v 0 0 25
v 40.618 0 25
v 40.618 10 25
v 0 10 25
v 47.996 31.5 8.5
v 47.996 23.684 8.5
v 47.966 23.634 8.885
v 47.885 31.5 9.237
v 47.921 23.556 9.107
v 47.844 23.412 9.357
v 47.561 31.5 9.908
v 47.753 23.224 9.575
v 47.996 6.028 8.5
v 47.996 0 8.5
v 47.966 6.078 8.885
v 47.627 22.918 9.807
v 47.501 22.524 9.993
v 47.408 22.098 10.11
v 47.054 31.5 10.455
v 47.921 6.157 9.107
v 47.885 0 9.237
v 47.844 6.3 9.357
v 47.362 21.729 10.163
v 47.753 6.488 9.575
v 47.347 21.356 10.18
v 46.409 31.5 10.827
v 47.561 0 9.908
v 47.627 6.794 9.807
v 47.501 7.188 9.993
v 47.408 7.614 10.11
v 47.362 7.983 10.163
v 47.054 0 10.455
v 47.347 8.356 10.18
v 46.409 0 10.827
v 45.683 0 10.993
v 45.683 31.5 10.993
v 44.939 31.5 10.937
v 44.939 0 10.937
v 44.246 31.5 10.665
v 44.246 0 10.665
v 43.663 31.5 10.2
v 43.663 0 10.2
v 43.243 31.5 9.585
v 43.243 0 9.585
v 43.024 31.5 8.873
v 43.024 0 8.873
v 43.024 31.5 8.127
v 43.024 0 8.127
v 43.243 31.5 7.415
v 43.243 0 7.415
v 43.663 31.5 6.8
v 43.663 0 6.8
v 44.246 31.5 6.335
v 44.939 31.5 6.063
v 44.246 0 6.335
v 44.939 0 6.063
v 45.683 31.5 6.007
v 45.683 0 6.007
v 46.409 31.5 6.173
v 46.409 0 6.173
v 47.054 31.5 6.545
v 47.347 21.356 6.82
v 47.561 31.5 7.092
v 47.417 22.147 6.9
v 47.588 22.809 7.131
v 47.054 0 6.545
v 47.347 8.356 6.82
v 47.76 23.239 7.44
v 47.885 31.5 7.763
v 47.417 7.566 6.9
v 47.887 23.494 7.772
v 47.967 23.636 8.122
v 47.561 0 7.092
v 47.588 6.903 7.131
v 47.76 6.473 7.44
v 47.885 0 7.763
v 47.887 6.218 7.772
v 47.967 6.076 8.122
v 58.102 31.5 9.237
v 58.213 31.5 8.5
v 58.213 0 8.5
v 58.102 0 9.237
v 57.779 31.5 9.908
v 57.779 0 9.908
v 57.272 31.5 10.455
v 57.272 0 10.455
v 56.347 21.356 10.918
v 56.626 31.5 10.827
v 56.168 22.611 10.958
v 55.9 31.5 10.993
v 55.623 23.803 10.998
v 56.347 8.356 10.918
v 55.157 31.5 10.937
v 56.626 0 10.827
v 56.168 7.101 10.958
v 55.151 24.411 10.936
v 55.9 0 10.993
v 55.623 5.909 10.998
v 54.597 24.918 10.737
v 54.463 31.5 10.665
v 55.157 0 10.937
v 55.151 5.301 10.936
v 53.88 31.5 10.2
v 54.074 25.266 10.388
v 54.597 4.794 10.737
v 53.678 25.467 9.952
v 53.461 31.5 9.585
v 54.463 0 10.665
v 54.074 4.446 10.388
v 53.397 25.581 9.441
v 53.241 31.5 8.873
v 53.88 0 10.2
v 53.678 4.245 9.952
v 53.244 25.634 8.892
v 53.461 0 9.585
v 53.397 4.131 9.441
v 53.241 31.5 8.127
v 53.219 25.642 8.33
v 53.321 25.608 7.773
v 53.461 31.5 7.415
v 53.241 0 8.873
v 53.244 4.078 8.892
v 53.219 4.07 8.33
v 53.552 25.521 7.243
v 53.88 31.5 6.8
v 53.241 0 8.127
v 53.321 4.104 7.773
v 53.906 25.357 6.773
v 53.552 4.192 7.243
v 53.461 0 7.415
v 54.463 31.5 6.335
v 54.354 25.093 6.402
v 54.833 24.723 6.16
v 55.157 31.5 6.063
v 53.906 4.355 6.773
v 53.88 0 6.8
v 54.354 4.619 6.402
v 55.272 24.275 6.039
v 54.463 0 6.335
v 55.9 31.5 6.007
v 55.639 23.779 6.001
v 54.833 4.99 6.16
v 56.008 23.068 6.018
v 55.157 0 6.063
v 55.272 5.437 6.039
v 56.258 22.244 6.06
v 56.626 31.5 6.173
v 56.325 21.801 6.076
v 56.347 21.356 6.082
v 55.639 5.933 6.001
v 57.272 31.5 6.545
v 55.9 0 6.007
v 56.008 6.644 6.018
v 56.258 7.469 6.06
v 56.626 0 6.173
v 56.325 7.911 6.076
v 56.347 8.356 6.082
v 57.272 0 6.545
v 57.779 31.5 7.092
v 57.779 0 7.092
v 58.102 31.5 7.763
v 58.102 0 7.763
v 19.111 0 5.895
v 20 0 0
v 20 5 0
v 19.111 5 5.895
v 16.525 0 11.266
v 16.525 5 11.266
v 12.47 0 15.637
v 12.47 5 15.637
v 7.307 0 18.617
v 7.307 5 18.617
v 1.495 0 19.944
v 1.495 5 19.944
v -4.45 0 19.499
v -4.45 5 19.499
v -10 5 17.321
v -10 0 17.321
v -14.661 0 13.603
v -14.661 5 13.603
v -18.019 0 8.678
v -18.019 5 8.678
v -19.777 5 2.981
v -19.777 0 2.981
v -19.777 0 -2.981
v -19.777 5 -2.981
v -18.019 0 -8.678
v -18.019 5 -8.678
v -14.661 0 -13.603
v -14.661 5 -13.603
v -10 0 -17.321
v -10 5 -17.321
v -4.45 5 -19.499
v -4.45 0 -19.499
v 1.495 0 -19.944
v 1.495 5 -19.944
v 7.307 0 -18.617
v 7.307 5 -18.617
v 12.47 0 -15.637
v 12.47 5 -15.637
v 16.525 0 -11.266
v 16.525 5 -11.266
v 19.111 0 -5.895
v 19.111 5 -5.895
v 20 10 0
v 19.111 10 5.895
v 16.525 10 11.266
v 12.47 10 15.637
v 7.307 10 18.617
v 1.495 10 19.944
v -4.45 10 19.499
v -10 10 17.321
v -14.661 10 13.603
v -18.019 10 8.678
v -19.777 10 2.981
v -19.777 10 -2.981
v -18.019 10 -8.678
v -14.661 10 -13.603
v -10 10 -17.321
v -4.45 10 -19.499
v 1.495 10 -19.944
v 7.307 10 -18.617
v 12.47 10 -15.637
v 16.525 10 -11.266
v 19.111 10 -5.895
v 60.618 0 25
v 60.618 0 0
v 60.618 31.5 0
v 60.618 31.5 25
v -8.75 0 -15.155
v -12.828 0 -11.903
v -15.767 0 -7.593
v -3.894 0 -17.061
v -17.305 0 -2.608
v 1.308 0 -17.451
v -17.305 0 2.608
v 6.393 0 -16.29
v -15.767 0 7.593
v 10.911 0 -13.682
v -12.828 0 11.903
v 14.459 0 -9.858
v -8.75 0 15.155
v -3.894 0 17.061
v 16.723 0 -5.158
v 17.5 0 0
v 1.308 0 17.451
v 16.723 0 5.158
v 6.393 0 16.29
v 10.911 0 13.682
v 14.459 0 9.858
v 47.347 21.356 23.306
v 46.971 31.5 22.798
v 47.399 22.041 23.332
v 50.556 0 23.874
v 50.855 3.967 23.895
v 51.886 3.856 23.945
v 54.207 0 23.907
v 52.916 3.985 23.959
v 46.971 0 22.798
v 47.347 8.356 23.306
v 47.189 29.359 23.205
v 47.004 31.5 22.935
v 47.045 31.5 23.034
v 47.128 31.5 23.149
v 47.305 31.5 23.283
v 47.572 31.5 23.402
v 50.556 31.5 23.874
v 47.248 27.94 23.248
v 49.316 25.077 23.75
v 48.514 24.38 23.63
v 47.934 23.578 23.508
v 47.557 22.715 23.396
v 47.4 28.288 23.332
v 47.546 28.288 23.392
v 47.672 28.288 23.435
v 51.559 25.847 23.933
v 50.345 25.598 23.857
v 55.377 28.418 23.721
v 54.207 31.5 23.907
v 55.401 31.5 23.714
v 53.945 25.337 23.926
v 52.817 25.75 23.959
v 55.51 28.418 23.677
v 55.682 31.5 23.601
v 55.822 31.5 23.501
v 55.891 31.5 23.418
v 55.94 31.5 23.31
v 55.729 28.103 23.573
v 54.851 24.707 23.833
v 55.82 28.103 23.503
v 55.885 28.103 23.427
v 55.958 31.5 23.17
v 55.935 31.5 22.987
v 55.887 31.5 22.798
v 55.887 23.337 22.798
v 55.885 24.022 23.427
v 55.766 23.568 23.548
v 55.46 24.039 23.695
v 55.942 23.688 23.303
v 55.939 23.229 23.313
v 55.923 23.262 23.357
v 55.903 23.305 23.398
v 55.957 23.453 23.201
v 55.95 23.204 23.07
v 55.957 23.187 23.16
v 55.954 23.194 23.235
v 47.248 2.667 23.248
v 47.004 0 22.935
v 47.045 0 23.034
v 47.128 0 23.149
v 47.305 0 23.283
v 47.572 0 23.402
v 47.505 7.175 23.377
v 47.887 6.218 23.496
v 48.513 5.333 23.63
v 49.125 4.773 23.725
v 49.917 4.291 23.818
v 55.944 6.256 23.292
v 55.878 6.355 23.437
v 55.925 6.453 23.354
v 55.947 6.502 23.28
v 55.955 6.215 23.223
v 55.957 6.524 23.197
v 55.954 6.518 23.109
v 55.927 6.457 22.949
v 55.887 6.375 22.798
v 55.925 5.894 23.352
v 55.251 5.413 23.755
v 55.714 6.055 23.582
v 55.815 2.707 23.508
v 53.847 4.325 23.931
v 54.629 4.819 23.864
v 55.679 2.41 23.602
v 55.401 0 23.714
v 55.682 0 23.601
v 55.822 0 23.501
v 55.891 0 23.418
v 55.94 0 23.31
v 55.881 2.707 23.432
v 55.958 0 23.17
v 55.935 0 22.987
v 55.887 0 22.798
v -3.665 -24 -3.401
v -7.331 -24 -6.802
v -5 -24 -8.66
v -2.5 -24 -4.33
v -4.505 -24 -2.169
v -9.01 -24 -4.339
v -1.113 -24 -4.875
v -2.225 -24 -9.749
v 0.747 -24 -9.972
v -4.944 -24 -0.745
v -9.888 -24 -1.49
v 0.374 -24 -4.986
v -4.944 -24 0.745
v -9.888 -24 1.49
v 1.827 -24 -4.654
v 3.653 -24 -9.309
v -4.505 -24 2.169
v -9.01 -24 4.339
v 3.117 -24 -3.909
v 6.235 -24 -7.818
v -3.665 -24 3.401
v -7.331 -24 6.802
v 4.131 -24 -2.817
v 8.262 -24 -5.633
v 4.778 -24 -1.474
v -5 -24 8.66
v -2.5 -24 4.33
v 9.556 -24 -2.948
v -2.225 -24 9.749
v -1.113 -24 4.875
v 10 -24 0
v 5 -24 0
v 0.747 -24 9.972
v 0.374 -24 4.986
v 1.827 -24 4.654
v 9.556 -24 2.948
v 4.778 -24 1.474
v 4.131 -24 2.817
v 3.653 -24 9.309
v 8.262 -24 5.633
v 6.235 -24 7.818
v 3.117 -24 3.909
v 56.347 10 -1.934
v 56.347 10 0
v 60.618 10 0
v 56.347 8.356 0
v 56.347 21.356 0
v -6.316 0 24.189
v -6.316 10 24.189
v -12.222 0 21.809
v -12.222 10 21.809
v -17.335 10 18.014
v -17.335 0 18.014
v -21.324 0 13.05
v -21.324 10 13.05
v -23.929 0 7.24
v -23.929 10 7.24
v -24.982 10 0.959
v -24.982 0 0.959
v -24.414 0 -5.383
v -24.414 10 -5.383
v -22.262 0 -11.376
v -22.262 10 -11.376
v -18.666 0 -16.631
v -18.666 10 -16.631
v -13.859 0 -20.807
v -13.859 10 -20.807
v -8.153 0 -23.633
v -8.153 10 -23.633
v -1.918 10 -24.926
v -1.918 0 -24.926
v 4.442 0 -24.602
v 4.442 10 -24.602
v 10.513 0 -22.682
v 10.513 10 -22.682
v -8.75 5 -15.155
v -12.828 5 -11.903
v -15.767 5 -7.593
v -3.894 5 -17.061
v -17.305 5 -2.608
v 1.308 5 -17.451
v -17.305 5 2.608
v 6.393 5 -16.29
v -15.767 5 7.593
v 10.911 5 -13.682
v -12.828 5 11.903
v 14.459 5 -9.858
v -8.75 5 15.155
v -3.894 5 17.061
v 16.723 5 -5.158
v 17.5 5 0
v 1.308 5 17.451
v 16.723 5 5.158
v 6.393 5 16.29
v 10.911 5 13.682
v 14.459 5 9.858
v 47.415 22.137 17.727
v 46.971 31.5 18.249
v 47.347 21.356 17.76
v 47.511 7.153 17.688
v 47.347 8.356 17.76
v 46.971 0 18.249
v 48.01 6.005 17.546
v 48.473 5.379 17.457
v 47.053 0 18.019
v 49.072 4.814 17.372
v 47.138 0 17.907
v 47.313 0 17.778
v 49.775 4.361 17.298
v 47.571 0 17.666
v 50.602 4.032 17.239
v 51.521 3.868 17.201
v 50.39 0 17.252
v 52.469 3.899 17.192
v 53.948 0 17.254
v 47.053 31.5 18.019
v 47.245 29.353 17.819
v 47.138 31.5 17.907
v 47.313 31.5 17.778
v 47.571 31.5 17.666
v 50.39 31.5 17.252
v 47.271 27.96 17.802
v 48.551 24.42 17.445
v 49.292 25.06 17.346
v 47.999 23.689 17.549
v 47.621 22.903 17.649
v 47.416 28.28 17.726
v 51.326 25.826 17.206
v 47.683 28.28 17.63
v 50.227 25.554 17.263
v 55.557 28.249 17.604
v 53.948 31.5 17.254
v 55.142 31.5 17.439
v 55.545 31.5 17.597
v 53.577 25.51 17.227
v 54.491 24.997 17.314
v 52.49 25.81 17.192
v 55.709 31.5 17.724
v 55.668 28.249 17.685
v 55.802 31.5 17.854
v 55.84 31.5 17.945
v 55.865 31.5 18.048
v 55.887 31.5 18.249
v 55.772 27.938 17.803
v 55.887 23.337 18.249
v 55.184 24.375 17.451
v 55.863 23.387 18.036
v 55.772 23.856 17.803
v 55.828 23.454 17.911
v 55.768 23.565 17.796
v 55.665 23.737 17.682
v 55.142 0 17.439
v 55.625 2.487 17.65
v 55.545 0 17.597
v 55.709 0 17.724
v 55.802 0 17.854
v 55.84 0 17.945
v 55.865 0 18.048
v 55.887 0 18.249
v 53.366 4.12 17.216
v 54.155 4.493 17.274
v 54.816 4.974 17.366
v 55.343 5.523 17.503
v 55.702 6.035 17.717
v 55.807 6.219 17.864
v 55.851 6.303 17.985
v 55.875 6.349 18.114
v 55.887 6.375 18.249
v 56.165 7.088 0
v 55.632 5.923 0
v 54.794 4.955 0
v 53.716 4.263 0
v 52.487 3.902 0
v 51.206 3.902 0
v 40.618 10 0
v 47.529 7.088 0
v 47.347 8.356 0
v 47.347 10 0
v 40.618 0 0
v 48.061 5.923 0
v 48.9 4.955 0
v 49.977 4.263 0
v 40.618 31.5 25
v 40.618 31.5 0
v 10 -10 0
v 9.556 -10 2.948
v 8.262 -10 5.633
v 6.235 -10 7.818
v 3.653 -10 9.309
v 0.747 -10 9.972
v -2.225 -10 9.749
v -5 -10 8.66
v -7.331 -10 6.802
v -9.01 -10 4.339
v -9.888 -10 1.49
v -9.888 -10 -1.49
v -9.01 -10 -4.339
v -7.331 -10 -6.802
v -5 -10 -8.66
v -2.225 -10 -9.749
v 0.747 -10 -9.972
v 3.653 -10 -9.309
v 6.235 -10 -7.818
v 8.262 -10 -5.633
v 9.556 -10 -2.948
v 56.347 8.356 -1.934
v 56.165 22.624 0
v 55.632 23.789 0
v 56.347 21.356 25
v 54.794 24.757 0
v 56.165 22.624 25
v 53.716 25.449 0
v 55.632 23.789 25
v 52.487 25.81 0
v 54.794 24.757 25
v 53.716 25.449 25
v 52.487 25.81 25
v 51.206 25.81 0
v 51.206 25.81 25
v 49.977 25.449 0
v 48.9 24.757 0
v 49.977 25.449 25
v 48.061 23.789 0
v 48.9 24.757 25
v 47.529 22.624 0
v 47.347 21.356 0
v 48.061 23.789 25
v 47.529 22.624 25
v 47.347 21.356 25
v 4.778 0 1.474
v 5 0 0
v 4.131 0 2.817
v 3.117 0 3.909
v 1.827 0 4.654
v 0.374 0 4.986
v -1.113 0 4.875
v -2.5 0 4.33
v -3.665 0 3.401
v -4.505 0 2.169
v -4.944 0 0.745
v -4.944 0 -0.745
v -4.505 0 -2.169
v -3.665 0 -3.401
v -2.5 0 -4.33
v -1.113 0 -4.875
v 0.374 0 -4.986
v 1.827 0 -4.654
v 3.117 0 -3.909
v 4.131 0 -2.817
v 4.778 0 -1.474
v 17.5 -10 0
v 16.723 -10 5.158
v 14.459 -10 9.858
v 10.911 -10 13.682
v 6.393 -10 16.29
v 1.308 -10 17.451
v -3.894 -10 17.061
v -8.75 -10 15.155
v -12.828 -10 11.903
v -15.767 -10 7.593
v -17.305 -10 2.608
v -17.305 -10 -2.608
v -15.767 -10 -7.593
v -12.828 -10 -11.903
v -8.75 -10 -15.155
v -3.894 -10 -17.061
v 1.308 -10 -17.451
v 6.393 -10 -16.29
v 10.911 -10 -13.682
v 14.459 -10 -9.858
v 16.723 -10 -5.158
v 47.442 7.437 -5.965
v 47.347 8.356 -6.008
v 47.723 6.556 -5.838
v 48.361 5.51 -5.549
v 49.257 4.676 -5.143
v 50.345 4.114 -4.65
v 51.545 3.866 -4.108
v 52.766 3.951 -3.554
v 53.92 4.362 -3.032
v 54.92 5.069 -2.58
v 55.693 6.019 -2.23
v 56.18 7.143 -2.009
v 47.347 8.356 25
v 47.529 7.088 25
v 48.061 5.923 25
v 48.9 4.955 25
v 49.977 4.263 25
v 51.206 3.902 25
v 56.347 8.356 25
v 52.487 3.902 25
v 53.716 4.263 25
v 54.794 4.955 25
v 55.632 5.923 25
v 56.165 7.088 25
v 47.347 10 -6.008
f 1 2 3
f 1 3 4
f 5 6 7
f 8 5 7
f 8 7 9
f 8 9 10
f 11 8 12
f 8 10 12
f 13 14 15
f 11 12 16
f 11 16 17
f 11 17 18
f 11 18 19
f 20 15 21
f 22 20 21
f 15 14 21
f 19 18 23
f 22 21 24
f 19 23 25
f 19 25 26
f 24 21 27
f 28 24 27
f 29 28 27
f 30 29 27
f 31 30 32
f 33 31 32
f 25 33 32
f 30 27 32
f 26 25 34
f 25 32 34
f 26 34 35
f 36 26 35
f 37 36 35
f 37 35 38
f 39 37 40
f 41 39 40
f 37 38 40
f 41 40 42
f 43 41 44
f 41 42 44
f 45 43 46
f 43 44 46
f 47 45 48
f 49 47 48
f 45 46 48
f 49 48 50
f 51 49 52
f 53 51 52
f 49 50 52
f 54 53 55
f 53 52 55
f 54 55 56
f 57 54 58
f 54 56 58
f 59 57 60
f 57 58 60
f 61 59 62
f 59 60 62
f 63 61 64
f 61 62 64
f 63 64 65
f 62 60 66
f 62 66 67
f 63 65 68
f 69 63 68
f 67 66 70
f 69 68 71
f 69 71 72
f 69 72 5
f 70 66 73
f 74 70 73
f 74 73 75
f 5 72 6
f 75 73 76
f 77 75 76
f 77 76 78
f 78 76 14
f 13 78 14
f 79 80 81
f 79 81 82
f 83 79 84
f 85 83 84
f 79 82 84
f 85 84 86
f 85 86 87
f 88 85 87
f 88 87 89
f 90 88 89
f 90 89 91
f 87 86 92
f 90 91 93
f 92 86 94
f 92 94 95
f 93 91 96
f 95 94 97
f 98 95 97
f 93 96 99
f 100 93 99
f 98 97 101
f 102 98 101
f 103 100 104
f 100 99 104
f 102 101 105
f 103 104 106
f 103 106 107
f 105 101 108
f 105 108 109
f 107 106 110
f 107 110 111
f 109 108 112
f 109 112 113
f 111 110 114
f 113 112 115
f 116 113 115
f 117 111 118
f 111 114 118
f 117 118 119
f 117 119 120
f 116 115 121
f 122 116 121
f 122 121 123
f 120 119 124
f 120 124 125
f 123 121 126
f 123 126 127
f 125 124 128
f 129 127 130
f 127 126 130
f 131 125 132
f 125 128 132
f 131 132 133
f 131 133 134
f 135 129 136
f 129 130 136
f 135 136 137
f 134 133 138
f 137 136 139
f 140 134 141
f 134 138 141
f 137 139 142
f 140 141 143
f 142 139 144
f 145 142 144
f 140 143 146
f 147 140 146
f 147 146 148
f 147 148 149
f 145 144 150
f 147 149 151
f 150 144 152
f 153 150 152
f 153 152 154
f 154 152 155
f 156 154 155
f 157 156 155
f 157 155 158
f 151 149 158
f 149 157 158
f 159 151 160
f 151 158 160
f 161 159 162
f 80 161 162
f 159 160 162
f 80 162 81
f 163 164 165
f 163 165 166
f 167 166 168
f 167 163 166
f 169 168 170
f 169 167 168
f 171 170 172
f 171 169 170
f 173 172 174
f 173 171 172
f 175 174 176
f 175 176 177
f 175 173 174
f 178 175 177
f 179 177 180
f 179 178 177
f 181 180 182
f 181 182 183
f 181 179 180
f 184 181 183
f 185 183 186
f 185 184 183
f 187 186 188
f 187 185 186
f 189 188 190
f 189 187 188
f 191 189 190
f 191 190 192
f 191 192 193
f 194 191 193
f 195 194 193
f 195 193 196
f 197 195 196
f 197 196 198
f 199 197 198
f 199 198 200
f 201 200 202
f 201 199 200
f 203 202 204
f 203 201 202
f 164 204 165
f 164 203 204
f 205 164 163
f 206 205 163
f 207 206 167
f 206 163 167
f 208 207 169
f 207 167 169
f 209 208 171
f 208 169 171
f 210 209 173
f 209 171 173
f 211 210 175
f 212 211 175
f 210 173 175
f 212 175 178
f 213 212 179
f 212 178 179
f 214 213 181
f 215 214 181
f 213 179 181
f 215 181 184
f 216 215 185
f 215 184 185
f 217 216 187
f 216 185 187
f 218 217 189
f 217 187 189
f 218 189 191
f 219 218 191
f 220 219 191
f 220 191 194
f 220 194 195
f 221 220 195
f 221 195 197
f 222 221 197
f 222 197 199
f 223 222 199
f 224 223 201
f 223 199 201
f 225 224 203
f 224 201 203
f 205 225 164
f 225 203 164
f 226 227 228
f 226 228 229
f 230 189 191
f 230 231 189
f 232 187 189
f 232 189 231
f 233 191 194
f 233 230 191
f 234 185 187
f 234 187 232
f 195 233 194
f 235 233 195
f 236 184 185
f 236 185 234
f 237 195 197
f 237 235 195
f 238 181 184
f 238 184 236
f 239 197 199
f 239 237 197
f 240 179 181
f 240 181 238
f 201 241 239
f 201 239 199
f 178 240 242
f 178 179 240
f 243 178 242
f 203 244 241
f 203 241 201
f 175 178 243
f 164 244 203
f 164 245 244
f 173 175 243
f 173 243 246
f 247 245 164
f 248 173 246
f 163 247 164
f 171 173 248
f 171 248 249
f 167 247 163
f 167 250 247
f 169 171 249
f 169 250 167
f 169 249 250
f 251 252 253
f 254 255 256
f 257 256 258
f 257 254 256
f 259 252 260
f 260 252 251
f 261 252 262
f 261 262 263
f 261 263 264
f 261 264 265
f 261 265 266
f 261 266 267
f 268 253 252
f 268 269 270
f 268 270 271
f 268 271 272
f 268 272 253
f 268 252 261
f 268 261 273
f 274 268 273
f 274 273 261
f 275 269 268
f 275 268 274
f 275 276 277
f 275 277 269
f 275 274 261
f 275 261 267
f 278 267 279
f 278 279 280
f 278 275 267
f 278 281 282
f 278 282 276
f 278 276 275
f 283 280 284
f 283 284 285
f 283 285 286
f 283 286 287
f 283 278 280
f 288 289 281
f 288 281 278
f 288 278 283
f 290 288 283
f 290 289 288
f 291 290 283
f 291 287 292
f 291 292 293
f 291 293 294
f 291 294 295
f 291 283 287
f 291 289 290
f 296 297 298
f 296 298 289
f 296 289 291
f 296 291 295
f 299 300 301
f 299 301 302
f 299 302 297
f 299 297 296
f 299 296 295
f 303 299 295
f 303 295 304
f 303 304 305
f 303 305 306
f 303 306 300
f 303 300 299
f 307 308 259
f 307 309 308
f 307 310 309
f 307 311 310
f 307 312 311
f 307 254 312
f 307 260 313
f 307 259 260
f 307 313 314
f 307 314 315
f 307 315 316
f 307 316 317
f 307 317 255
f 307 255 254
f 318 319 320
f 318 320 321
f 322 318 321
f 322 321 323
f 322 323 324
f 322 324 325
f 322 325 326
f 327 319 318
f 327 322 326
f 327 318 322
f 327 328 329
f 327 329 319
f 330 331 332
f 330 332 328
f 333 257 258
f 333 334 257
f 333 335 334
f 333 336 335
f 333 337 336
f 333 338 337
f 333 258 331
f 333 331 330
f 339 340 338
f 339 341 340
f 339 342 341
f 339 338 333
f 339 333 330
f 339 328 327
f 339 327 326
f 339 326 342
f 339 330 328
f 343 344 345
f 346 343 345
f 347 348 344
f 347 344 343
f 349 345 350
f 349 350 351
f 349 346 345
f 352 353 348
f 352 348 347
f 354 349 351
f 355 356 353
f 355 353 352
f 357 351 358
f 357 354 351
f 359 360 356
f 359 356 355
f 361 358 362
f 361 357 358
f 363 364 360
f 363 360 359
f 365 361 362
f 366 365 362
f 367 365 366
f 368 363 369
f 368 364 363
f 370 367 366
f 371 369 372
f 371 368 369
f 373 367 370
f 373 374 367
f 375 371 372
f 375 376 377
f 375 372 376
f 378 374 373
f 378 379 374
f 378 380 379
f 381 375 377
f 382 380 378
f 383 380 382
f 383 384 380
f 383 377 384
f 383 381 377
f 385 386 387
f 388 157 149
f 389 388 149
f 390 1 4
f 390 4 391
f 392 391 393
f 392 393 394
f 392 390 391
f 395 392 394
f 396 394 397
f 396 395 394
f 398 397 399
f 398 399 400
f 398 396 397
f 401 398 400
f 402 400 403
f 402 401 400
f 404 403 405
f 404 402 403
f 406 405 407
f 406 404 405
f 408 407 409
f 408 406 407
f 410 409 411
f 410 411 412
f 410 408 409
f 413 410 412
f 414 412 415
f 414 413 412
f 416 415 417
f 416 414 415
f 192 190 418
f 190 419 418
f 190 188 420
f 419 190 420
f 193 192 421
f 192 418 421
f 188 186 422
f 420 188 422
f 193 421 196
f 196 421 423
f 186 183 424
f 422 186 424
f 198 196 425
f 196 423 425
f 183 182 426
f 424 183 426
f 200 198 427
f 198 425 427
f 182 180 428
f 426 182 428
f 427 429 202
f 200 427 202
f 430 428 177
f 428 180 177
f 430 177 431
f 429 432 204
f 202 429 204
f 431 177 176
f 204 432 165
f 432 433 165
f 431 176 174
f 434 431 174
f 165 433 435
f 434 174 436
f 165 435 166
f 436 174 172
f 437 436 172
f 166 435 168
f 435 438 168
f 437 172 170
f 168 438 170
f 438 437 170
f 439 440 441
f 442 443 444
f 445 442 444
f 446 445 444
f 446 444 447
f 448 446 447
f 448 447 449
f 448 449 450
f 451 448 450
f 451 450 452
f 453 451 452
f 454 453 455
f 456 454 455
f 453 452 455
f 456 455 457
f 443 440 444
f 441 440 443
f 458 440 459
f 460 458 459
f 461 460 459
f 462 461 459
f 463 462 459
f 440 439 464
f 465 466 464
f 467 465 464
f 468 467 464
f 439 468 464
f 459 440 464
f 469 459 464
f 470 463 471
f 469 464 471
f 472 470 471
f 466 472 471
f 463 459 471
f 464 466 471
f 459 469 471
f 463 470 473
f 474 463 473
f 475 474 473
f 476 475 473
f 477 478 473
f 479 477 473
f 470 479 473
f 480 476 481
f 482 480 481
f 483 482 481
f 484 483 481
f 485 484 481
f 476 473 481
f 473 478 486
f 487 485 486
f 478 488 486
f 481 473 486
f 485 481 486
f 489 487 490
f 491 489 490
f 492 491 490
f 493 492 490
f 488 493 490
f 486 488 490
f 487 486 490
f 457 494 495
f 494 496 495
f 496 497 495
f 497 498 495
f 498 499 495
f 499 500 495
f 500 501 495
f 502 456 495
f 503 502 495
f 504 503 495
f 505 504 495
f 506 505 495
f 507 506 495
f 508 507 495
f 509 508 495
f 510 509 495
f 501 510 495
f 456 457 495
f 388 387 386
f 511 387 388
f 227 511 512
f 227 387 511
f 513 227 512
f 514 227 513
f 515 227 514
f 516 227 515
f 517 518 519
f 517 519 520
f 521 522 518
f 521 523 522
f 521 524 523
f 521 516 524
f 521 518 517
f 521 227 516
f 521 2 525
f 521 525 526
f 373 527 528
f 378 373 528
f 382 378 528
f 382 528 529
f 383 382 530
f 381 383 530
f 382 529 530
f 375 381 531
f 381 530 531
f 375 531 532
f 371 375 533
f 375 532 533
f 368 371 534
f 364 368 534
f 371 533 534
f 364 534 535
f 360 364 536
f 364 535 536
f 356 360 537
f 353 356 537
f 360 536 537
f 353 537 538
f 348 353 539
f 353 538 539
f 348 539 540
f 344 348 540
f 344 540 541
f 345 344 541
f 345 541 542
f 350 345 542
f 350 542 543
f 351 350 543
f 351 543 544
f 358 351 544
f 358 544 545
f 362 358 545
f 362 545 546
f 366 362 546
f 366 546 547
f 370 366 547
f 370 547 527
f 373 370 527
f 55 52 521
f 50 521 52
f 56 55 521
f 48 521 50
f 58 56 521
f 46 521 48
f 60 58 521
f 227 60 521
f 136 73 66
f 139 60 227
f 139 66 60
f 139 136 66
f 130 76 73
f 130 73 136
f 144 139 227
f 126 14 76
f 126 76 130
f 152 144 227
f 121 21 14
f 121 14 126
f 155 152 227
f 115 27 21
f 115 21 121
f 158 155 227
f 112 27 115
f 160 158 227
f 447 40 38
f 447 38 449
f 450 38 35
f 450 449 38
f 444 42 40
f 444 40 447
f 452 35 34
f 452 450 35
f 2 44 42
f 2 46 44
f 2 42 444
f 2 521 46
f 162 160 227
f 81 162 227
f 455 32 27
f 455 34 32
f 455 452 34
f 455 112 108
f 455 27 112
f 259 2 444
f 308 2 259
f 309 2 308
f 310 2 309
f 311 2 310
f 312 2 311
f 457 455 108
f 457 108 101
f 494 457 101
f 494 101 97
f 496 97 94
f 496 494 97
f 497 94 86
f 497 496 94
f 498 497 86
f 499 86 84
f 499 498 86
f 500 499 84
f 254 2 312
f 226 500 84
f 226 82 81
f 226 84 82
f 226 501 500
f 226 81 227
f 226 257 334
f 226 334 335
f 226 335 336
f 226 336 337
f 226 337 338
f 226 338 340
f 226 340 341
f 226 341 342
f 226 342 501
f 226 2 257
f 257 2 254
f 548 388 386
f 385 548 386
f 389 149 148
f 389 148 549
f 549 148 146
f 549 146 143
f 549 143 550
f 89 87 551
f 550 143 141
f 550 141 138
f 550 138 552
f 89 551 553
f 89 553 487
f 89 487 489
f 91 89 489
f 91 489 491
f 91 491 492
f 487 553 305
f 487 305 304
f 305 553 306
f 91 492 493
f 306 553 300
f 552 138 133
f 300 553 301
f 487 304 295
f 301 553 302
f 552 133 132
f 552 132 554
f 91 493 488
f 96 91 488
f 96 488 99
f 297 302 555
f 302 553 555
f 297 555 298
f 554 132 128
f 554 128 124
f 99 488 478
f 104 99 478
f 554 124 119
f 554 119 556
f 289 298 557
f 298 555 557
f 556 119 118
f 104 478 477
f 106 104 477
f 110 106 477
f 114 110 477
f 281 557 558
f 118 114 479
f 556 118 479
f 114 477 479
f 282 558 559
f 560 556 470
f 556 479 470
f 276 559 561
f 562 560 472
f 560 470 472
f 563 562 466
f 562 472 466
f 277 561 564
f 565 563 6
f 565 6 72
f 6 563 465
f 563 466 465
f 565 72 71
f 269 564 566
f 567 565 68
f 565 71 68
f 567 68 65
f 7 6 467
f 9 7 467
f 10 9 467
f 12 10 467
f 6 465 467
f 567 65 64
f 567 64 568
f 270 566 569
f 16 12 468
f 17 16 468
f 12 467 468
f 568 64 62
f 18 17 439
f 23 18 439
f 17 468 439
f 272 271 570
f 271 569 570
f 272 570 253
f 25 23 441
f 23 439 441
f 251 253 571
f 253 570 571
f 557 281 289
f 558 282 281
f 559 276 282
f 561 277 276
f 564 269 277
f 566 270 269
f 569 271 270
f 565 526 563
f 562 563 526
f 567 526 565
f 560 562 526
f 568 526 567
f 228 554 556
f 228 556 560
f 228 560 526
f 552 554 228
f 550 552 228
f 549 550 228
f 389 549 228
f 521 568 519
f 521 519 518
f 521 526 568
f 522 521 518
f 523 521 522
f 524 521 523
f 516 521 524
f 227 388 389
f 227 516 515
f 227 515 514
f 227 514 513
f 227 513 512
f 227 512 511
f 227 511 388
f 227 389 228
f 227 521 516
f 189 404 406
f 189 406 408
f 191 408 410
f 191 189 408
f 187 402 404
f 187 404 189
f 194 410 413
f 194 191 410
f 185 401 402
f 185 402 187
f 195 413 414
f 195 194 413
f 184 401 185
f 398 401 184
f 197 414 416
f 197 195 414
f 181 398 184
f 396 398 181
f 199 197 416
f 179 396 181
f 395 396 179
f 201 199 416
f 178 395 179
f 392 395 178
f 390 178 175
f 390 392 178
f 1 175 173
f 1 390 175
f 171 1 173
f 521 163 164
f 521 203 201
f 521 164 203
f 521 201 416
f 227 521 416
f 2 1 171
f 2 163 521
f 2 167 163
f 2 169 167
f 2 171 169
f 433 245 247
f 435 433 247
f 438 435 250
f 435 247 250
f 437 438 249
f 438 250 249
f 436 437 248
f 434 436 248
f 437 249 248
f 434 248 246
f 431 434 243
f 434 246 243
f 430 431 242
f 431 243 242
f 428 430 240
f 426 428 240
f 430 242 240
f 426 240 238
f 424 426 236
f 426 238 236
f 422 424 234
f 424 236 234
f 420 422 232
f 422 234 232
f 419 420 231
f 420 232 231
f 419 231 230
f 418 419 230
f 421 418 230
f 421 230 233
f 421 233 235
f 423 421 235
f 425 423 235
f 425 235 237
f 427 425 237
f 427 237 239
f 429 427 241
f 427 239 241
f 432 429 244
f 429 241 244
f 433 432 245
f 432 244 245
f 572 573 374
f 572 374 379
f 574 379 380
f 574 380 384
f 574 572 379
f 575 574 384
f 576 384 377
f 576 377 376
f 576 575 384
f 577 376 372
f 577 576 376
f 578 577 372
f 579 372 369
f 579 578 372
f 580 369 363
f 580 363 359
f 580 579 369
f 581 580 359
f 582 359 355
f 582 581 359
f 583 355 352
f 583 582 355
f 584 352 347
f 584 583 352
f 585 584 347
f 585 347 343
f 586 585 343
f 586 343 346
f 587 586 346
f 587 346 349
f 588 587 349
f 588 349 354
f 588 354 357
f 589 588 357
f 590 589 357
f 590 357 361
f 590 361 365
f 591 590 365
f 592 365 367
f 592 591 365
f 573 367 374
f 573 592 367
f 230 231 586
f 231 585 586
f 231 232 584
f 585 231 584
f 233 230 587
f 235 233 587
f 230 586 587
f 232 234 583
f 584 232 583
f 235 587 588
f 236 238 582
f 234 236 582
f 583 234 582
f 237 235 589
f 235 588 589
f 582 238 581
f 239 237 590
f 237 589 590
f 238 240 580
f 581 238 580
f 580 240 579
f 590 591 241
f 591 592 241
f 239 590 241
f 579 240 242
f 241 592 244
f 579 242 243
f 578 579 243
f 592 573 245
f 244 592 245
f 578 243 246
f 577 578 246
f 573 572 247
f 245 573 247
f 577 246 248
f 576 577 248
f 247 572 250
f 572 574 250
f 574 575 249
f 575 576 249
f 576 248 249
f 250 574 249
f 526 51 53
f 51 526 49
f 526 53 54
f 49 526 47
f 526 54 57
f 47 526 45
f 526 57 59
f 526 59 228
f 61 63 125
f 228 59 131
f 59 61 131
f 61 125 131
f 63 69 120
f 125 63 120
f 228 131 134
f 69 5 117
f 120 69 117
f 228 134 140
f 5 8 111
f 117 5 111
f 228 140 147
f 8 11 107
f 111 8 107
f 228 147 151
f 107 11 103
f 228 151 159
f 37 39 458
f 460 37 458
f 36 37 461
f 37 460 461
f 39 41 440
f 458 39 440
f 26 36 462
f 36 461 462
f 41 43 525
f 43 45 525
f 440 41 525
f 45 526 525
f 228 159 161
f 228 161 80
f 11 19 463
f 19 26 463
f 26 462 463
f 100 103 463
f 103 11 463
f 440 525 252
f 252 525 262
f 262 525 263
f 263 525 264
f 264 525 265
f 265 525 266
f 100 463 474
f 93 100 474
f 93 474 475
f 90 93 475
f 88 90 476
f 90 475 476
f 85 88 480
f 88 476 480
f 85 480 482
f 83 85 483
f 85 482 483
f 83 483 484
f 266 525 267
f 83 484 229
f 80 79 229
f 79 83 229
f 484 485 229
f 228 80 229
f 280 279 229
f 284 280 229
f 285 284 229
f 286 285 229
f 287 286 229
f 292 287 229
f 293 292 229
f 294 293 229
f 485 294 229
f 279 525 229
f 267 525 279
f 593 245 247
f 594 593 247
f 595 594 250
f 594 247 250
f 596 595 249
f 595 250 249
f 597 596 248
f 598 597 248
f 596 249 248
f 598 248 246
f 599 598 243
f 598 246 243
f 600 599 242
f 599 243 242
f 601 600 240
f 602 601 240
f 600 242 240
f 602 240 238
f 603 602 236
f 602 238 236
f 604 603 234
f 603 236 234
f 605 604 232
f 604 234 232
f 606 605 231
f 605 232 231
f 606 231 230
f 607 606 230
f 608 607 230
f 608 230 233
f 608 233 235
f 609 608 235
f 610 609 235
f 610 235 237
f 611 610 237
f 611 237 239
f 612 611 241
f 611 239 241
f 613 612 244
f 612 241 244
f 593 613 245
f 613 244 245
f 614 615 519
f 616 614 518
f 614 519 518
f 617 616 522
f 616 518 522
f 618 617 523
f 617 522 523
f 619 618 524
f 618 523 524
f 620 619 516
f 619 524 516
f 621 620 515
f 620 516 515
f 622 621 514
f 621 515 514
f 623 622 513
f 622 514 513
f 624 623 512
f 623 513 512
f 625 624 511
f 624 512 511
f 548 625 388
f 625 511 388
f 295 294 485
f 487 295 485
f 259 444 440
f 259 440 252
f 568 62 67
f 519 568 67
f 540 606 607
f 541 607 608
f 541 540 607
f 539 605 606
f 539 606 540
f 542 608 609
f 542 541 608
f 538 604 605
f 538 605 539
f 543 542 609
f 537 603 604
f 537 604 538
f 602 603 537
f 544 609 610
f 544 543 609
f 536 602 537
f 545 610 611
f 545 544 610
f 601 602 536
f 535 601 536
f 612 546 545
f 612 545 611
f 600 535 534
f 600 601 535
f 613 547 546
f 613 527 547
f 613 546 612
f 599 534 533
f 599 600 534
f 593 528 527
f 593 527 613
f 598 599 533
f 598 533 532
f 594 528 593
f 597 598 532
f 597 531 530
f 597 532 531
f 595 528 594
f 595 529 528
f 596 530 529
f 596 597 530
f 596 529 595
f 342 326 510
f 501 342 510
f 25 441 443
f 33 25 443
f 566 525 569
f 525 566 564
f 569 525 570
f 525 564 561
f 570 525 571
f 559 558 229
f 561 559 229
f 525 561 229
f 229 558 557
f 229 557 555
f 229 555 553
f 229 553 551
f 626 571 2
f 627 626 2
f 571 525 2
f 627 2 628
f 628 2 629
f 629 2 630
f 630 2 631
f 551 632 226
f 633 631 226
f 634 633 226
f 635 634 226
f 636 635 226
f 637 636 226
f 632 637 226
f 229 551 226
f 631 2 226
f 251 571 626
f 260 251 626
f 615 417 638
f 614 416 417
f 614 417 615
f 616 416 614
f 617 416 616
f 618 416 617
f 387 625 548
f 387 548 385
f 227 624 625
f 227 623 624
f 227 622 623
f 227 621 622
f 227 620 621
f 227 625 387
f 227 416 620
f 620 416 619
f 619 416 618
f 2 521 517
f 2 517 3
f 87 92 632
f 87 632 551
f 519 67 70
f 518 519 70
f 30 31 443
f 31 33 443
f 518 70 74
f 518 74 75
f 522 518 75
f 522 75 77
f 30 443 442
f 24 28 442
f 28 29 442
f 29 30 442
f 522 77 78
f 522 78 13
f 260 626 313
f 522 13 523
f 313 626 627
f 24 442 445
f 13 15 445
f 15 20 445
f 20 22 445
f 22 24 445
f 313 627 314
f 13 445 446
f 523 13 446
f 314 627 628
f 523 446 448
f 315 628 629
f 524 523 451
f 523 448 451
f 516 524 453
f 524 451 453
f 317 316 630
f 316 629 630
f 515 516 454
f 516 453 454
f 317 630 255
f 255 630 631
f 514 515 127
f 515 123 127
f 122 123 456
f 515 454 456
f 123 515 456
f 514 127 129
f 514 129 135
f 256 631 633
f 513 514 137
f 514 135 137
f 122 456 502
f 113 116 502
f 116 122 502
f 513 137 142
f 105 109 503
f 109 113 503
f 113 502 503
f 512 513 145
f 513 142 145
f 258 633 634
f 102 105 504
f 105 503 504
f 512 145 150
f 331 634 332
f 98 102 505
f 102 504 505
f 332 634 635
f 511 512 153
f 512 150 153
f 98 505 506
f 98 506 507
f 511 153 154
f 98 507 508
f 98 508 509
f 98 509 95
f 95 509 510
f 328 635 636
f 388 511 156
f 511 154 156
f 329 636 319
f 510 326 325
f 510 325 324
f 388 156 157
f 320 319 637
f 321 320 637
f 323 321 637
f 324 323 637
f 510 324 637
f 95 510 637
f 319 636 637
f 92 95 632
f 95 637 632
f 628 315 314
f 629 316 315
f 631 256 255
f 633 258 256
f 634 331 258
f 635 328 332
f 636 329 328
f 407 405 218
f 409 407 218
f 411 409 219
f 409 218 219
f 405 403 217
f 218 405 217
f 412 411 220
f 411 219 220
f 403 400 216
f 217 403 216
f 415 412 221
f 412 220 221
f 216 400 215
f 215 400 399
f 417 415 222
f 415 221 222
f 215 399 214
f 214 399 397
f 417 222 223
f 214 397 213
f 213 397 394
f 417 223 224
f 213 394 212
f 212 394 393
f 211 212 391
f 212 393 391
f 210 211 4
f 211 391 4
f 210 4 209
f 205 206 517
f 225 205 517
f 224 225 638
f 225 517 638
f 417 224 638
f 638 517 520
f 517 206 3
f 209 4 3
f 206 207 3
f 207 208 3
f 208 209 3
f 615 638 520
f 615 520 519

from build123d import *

# Parameters (mm, degrees)
F0_R          = 20
F1_DEPTH      = 10
F0_R_2        = 17.5
F2_DEPTH      = 5
F0_R_3        = 10
F3_DEPTH      = 10
F0_R_4        = 5
F4_DEPTH      = 24
F0_W          = 20
F0_H          = 17
F0_R_5        = 2.5
F0_H_2        = 8
F5_DEPTH      = 31.5
F7_DEPTH      = 25
F7_DEPTH_BACK = 25


with BuildPart() as f1:
    # F0 (on Front) → F1 (new body)
    with BuildSketch(Plane.XZ):
        with BuildLine():
            ThreePointArc((0, 25), (-24.4136250072, -5.3828351274), (10.513161462, -22.6820068793))
            Line((10.513161462, -22.6820068793), (60.6183165254, 0))
            Line((60.6183165254, 0), (40.6183165254, 0))
            Line((40.6183165254, 0), (40.6183165254, 17))
            Line((40.6183165254, 17), (40.6183165254, 25))
            Line((40.6183165254, 25), (0, 25))
        make_face()
        Circle(F0_R, mode=Mode.SUBTRACT)
    extrude(amount=-F1_DEPTH)


with BuildPart() as f2:
    # F0 (on Front) → F2 (new body)
    with BuildSketch(Plane.XZ):
        Circle(F0_R)
        Circle(F0_R_2, mode=Mode.SUBTRACT)
    extrude(amount=-F2_DEPTH)


with BuildPart() as f3:
    # F0 (on Front) → F3 (new body)
    with BuildSketch(Plane.XZ):
        Circle(F0_R_2)
        Circle(F0_R_3, mode=Mode.SUBTRACT)
    extrude(amount=F3_DEPTH)

    # F0 (on Front) → F4 (join)
    with BuildSketch(Plane.XZ):
        Circle(F0_R_3)
        Circle(F0_R_4, mode=Mode.SUBTRACT)
    extrude(amount=F4_DEPTH)


with BuildPart() as f5:
    # F0 (on Front) → F5 (new body)
    with BuildSketch(Plane.XZ):
        with Locations((50.6183165254, 8.5)):
            Rectangle(F0_W, F0_H)
        with Locations((45.4957149923, 8.5)):
            Circle(F0_R_5, mode=Mode.SUBTRACT)
        with Locations((55.7129792869, 8.5)):
            Circle(F0_R_5, mode=Mode.SUBTRACT)
        with Locations((50.6183165254, 21)):
            Rectangle(F0_W, F0_H_2)
        with BuildLine():
            Line((46.9712242484, 18.2492788881), (46.9712242484, 22.7982457727))
            add(Edge.make_bspline(
                [(46.9712242484, 22.7982457727), (47.0120098226, 22.9971951161), (47.1857904213, 23.8448854268), (56.3106171556, 24.336941652), (55.96942084, 23.0970469938), (55.887196213, 22.7982457727)],
                knots=[0, 0, 0, 0, 0.188815903, 0.8045133939, 1, 1, 1, 1], degree=3))
            Line((55.887196213, 22.7982457727), (55.887196213, 18.2492788881))
            add(Edge.make_bspline(
                [(46.9712242484, 18.2492788881), (47.0205545118, 18.0544865699), (47.2293355492, 17.2300648164), (55.7829701616, 16.898893848), (55.8663806592, 17.9795861186), (55.887196213, 18.2492788881)],
                knots=[0, 0, 0, 0, 0.1884234089, 0.7974665457, 1, 1, 1, 1], degree=3))
        make_face(mode=Mode.SUBTRACT)
    extrude(amount=-F5_DEPTH)


with BuildPart() as f7_tool:
    # F6 (on Top) → F7 (new body, two sides)
    with BuildSketch(Plane.XY) as f7_sk:
        with BuildLine():
            ThreePointArc((56.346829528, 21.3560446687), (51.846829528, 25.8560446687), (47.346829528, 21.3560446687))
            Line((47.346829528, 21.3560446687), (47.346829528, 8.3560446687))
            ThreePointArc((47.346829528, 8.3560446687), (51.846829528, 3.8560446687), (56.346829528, 8.3560446687))
            Line((56.346829528, 8.3560446687), (56.346829528, 21.3560446687))
        make_face()
    extrude(amount=F7_DEPTH)
    extrude(f7_sk.sketch, amount=-F7_DEPTH_BACK)


with BuildPart() as f1_1:
    add(f1.part)

    # F7: cut by f7_tool
    add(f7_tool.part, mode=Mode.SUBTRACT)


with BuildPart() as f5_1:
    add(f5.part)

    # F7: cut by f7_tool
    add(f7_tool.part, mode=Mode.SUBTRACT)


solid = Compound([f2.part, f3.part, f1_1.part, f5_1.part])
